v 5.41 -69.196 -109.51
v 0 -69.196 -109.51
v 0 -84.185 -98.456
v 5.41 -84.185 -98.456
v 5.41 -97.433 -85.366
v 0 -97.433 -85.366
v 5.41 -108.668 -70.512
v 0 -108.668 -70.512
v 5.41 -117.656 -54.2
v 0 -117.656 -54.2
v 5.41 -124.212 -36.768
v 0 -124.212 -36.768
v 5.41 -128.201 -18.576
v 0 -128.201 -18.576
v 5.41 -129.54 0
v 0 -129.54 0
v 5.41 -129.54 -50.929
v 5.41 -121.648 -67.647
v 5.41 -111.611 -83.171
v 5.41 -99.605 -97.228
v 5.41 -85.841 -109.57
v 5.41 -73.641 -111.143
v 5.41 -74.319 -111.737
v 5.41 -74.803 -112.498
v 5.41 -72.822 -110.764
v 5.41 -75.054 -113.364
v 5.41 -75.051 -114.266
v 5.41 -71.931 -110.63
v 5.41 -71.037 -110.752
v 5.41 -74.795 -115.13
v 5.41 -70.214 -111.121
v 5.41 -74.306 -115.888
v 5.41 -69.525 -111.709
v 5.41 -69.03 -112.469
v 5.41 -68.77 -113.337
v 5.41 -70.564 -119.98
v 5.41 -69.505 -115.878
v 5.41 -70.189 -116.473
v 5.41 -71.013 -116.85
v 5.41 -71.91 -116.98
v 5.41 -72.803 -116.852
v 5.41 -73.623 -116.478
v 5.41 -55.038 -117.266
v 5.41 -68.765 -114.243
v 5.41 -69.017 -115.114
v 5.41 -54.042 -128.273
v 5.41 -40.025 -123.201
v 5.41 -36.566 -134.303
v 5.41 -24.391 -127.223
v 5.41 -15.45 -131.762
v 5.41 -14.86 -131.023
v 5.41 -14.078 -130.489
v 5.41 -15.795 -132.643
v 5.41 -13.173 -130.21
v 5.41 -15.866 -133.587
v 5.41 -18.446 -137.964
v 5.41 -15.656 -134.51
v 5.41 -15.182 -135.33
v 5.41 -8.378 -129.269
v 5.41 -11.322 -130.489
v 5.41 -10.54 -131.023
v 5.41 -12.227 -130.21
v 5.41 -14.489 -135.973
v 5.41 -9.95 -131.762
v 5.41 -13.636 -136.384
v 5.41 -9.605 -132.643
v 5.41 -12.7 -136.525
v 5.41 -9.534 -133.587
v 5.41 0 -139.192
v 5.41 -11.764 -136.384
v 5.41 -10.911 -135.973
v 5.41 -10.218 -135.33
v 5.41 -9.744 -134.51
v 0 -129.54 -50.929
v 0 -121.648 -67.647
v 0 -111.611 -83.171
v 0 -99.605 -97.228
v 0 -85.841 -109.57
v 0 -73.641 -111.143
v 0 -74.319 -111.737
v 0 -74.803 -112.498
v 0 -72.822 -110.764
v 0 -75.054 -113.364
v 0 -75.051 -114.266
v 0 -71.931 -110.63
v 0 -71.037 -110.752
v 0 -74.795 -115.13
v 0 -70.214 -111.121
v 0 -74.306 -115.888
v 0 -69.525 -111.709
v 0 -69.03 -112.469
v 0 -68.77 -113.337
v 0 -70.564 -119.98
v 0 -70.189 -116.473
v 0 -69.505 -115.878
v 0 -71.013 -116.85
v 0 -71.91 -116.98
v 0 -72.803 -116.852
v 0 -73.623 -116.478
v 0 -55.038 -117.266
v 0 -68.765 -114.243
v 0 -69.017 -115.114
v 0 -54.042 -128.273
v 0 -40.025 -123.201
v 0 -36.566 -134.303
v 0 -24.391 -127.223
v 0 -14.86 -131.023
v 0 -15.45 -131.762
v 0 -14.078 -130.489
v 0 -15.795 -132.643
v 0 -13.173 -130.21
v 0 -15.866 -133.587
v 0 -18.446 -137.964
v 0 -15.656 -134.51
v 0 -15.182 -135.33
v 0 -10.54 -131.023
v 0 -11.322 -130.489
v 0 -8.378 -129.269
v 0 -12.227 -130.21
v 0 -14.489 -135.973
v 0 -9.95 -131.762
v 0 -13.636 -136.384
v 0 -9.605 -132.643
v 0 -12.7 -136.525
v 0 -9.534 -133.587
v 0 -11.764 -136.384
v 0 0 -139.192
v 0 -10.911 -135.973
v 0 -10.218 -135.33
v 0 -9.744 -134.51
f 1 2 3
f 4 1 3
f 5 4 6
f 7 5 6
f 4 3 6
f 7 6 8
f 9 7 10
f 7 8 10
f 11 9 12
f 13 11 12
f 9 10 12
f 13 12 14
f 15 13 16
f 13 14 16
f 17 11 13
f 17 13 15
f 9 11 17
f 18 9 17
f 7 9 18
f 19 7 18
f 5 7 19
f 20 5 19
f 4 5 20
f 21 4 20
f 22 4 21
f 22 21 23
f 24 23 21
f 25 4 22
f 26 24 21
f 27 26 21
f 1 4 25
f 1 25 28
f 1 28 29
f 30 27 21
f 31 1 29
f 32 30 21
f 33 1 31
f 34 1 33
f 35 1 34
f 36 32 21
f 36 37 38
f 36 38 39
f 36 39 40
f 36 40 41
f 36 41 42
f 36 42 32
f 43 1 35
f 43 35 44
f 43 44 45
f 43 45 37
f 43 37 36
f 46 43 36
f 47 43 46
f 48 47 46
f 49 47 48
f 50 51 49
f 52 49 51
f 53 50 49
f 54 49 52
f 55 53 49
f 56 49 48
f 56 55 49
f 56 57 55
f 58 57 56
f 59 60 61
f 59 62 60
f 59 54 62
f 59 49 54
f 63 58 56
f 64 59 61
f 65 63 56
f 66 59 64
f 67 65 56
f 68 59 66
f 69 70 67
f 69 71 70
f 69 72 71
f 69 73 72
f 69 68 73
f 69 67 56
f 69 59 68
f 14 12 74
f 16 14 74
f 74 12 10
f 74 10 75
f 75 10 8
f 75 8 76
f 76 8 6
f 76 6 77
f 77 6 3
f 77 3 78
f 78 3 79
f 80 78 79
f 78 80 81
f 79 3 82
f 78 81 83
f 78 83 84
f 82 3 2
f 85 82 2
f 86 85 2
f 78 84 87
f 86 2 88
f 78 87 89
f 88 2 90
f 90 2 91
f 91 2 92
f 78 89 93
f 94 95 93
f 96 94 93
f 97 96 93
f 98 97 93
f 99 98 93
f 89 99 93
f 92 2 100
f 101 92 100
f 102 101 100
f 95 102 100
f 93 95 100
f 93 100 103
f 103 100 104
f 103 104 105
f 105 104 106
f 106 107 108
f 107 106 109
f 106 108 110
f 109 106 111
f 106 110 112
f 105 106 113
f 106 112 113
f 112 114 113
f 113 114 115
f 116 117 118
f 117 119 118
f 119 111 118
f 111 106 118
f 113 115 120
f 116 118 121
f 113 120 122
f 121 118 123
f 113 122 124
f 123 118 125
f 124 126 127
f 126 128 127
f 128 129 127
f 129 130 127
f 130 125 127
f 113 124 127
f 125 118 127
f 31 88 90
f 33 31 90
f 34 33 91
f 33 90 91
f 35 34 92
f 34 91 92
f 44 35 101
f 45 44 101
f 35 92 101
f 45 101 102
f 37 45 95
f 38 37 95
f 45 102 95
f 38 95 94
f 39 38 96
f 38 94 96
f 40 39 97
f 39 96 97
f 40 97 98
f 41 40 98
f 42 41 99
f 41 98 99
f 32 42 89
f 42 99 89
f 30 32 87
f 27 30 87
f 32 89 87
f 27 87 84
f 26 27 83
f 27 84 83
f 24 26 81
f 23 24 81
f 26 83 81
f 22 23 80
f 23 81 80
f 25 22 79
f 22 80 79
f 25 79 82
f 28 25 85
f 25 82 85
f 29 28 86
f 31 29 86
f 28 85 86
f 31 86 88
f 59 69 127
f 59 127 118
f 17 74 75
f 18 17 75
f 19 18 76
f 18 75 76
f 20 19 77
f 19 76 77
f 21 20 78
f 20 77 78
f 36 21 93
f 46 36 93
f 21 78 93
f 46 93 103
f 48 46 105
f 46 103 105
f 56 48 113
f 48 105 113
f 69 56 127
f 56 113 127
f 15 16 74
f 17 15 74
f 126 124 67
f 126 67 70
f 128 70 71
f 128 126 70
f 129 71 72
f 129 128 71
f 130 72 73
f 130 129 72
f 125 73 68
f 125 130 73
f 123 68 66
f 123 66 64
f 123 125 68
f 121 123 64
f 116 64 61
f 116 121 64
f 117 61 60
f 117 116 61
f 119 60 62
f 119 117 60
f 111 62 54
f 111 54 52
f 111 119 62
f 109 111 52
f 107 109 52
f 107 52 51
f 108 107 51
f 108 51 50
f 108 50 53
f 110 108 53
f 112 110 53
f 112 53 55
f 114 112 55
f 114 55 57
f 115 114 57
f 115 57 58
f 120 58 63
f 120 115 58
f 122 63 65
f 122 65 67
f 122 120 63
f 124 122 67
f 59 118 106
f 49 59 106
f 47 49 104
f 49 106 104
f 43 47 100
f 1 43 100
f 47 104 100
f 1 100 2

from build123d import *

# Parameters (mm, degrees)
SKETCH1_R           = 3.175
BOSS_EXTRUDE2_DEPTH = 5.4102
CUT_EXTRUDE1_DEPTH  = 5.4102


with BuildPart() as part:
    # Sketch1 → Boss-Extrude2 (new body)
    with BuildSketch(Plane(origin=(0, 0, 0), x_dir=(0, 0, -1), z_dir=(1, 0, 0))):
        with BuildLine():
            ThreePointArc((109.510185389, -69.196321406), (62.517678, -113.455504659), (0, -129.54))
            Line((0, -129.54), (50.929375256, -129.54))
            ThreePointArc((50.929375256, -129.54), (115.029071249, -78.375542305), (139.192, 0))
            Line((139.192, 0), (129.54, 0))
            ThreePointArc((129.54, 0), (124.431830765, -36.01848265), (109.510185389, -69.196321406))
        make_face()
        with BuildLine():
            ThreePointArc((116.979702463, -71.909902638), (112.921896515, -74.959702412), (111.120629291, -70.213914368))
            ThreePointArc((111.120629291, -70.213914368), (114.68750841, -68.860102864), (116.979702463, -71.909902638))
        make_face(mode=Mode.SUBTRACT)
        with Locations((133.35, -12.7)):
            Circle(SKETCH1_R, mode=Mode.SUBTRACT)
    extrude(amount=BOSS_EXTRUDE2_DEPTH)

    # Sketch2 → Cut-Extrude1 (cut)
    with BuildSketch(Plane(origin=(5.4102, 0, 0), x_dir=(0, 0, -1), z_dir=(1, 0, 0))):
        Polygon((139.192, 0), (129.268805309, -8.37780246), (129.54, 0), align=None)
    extrude(amount=-CUT_EXTRUDE1_DEPTH, mode=Mode.SUBTRACT)


solid = part.part
